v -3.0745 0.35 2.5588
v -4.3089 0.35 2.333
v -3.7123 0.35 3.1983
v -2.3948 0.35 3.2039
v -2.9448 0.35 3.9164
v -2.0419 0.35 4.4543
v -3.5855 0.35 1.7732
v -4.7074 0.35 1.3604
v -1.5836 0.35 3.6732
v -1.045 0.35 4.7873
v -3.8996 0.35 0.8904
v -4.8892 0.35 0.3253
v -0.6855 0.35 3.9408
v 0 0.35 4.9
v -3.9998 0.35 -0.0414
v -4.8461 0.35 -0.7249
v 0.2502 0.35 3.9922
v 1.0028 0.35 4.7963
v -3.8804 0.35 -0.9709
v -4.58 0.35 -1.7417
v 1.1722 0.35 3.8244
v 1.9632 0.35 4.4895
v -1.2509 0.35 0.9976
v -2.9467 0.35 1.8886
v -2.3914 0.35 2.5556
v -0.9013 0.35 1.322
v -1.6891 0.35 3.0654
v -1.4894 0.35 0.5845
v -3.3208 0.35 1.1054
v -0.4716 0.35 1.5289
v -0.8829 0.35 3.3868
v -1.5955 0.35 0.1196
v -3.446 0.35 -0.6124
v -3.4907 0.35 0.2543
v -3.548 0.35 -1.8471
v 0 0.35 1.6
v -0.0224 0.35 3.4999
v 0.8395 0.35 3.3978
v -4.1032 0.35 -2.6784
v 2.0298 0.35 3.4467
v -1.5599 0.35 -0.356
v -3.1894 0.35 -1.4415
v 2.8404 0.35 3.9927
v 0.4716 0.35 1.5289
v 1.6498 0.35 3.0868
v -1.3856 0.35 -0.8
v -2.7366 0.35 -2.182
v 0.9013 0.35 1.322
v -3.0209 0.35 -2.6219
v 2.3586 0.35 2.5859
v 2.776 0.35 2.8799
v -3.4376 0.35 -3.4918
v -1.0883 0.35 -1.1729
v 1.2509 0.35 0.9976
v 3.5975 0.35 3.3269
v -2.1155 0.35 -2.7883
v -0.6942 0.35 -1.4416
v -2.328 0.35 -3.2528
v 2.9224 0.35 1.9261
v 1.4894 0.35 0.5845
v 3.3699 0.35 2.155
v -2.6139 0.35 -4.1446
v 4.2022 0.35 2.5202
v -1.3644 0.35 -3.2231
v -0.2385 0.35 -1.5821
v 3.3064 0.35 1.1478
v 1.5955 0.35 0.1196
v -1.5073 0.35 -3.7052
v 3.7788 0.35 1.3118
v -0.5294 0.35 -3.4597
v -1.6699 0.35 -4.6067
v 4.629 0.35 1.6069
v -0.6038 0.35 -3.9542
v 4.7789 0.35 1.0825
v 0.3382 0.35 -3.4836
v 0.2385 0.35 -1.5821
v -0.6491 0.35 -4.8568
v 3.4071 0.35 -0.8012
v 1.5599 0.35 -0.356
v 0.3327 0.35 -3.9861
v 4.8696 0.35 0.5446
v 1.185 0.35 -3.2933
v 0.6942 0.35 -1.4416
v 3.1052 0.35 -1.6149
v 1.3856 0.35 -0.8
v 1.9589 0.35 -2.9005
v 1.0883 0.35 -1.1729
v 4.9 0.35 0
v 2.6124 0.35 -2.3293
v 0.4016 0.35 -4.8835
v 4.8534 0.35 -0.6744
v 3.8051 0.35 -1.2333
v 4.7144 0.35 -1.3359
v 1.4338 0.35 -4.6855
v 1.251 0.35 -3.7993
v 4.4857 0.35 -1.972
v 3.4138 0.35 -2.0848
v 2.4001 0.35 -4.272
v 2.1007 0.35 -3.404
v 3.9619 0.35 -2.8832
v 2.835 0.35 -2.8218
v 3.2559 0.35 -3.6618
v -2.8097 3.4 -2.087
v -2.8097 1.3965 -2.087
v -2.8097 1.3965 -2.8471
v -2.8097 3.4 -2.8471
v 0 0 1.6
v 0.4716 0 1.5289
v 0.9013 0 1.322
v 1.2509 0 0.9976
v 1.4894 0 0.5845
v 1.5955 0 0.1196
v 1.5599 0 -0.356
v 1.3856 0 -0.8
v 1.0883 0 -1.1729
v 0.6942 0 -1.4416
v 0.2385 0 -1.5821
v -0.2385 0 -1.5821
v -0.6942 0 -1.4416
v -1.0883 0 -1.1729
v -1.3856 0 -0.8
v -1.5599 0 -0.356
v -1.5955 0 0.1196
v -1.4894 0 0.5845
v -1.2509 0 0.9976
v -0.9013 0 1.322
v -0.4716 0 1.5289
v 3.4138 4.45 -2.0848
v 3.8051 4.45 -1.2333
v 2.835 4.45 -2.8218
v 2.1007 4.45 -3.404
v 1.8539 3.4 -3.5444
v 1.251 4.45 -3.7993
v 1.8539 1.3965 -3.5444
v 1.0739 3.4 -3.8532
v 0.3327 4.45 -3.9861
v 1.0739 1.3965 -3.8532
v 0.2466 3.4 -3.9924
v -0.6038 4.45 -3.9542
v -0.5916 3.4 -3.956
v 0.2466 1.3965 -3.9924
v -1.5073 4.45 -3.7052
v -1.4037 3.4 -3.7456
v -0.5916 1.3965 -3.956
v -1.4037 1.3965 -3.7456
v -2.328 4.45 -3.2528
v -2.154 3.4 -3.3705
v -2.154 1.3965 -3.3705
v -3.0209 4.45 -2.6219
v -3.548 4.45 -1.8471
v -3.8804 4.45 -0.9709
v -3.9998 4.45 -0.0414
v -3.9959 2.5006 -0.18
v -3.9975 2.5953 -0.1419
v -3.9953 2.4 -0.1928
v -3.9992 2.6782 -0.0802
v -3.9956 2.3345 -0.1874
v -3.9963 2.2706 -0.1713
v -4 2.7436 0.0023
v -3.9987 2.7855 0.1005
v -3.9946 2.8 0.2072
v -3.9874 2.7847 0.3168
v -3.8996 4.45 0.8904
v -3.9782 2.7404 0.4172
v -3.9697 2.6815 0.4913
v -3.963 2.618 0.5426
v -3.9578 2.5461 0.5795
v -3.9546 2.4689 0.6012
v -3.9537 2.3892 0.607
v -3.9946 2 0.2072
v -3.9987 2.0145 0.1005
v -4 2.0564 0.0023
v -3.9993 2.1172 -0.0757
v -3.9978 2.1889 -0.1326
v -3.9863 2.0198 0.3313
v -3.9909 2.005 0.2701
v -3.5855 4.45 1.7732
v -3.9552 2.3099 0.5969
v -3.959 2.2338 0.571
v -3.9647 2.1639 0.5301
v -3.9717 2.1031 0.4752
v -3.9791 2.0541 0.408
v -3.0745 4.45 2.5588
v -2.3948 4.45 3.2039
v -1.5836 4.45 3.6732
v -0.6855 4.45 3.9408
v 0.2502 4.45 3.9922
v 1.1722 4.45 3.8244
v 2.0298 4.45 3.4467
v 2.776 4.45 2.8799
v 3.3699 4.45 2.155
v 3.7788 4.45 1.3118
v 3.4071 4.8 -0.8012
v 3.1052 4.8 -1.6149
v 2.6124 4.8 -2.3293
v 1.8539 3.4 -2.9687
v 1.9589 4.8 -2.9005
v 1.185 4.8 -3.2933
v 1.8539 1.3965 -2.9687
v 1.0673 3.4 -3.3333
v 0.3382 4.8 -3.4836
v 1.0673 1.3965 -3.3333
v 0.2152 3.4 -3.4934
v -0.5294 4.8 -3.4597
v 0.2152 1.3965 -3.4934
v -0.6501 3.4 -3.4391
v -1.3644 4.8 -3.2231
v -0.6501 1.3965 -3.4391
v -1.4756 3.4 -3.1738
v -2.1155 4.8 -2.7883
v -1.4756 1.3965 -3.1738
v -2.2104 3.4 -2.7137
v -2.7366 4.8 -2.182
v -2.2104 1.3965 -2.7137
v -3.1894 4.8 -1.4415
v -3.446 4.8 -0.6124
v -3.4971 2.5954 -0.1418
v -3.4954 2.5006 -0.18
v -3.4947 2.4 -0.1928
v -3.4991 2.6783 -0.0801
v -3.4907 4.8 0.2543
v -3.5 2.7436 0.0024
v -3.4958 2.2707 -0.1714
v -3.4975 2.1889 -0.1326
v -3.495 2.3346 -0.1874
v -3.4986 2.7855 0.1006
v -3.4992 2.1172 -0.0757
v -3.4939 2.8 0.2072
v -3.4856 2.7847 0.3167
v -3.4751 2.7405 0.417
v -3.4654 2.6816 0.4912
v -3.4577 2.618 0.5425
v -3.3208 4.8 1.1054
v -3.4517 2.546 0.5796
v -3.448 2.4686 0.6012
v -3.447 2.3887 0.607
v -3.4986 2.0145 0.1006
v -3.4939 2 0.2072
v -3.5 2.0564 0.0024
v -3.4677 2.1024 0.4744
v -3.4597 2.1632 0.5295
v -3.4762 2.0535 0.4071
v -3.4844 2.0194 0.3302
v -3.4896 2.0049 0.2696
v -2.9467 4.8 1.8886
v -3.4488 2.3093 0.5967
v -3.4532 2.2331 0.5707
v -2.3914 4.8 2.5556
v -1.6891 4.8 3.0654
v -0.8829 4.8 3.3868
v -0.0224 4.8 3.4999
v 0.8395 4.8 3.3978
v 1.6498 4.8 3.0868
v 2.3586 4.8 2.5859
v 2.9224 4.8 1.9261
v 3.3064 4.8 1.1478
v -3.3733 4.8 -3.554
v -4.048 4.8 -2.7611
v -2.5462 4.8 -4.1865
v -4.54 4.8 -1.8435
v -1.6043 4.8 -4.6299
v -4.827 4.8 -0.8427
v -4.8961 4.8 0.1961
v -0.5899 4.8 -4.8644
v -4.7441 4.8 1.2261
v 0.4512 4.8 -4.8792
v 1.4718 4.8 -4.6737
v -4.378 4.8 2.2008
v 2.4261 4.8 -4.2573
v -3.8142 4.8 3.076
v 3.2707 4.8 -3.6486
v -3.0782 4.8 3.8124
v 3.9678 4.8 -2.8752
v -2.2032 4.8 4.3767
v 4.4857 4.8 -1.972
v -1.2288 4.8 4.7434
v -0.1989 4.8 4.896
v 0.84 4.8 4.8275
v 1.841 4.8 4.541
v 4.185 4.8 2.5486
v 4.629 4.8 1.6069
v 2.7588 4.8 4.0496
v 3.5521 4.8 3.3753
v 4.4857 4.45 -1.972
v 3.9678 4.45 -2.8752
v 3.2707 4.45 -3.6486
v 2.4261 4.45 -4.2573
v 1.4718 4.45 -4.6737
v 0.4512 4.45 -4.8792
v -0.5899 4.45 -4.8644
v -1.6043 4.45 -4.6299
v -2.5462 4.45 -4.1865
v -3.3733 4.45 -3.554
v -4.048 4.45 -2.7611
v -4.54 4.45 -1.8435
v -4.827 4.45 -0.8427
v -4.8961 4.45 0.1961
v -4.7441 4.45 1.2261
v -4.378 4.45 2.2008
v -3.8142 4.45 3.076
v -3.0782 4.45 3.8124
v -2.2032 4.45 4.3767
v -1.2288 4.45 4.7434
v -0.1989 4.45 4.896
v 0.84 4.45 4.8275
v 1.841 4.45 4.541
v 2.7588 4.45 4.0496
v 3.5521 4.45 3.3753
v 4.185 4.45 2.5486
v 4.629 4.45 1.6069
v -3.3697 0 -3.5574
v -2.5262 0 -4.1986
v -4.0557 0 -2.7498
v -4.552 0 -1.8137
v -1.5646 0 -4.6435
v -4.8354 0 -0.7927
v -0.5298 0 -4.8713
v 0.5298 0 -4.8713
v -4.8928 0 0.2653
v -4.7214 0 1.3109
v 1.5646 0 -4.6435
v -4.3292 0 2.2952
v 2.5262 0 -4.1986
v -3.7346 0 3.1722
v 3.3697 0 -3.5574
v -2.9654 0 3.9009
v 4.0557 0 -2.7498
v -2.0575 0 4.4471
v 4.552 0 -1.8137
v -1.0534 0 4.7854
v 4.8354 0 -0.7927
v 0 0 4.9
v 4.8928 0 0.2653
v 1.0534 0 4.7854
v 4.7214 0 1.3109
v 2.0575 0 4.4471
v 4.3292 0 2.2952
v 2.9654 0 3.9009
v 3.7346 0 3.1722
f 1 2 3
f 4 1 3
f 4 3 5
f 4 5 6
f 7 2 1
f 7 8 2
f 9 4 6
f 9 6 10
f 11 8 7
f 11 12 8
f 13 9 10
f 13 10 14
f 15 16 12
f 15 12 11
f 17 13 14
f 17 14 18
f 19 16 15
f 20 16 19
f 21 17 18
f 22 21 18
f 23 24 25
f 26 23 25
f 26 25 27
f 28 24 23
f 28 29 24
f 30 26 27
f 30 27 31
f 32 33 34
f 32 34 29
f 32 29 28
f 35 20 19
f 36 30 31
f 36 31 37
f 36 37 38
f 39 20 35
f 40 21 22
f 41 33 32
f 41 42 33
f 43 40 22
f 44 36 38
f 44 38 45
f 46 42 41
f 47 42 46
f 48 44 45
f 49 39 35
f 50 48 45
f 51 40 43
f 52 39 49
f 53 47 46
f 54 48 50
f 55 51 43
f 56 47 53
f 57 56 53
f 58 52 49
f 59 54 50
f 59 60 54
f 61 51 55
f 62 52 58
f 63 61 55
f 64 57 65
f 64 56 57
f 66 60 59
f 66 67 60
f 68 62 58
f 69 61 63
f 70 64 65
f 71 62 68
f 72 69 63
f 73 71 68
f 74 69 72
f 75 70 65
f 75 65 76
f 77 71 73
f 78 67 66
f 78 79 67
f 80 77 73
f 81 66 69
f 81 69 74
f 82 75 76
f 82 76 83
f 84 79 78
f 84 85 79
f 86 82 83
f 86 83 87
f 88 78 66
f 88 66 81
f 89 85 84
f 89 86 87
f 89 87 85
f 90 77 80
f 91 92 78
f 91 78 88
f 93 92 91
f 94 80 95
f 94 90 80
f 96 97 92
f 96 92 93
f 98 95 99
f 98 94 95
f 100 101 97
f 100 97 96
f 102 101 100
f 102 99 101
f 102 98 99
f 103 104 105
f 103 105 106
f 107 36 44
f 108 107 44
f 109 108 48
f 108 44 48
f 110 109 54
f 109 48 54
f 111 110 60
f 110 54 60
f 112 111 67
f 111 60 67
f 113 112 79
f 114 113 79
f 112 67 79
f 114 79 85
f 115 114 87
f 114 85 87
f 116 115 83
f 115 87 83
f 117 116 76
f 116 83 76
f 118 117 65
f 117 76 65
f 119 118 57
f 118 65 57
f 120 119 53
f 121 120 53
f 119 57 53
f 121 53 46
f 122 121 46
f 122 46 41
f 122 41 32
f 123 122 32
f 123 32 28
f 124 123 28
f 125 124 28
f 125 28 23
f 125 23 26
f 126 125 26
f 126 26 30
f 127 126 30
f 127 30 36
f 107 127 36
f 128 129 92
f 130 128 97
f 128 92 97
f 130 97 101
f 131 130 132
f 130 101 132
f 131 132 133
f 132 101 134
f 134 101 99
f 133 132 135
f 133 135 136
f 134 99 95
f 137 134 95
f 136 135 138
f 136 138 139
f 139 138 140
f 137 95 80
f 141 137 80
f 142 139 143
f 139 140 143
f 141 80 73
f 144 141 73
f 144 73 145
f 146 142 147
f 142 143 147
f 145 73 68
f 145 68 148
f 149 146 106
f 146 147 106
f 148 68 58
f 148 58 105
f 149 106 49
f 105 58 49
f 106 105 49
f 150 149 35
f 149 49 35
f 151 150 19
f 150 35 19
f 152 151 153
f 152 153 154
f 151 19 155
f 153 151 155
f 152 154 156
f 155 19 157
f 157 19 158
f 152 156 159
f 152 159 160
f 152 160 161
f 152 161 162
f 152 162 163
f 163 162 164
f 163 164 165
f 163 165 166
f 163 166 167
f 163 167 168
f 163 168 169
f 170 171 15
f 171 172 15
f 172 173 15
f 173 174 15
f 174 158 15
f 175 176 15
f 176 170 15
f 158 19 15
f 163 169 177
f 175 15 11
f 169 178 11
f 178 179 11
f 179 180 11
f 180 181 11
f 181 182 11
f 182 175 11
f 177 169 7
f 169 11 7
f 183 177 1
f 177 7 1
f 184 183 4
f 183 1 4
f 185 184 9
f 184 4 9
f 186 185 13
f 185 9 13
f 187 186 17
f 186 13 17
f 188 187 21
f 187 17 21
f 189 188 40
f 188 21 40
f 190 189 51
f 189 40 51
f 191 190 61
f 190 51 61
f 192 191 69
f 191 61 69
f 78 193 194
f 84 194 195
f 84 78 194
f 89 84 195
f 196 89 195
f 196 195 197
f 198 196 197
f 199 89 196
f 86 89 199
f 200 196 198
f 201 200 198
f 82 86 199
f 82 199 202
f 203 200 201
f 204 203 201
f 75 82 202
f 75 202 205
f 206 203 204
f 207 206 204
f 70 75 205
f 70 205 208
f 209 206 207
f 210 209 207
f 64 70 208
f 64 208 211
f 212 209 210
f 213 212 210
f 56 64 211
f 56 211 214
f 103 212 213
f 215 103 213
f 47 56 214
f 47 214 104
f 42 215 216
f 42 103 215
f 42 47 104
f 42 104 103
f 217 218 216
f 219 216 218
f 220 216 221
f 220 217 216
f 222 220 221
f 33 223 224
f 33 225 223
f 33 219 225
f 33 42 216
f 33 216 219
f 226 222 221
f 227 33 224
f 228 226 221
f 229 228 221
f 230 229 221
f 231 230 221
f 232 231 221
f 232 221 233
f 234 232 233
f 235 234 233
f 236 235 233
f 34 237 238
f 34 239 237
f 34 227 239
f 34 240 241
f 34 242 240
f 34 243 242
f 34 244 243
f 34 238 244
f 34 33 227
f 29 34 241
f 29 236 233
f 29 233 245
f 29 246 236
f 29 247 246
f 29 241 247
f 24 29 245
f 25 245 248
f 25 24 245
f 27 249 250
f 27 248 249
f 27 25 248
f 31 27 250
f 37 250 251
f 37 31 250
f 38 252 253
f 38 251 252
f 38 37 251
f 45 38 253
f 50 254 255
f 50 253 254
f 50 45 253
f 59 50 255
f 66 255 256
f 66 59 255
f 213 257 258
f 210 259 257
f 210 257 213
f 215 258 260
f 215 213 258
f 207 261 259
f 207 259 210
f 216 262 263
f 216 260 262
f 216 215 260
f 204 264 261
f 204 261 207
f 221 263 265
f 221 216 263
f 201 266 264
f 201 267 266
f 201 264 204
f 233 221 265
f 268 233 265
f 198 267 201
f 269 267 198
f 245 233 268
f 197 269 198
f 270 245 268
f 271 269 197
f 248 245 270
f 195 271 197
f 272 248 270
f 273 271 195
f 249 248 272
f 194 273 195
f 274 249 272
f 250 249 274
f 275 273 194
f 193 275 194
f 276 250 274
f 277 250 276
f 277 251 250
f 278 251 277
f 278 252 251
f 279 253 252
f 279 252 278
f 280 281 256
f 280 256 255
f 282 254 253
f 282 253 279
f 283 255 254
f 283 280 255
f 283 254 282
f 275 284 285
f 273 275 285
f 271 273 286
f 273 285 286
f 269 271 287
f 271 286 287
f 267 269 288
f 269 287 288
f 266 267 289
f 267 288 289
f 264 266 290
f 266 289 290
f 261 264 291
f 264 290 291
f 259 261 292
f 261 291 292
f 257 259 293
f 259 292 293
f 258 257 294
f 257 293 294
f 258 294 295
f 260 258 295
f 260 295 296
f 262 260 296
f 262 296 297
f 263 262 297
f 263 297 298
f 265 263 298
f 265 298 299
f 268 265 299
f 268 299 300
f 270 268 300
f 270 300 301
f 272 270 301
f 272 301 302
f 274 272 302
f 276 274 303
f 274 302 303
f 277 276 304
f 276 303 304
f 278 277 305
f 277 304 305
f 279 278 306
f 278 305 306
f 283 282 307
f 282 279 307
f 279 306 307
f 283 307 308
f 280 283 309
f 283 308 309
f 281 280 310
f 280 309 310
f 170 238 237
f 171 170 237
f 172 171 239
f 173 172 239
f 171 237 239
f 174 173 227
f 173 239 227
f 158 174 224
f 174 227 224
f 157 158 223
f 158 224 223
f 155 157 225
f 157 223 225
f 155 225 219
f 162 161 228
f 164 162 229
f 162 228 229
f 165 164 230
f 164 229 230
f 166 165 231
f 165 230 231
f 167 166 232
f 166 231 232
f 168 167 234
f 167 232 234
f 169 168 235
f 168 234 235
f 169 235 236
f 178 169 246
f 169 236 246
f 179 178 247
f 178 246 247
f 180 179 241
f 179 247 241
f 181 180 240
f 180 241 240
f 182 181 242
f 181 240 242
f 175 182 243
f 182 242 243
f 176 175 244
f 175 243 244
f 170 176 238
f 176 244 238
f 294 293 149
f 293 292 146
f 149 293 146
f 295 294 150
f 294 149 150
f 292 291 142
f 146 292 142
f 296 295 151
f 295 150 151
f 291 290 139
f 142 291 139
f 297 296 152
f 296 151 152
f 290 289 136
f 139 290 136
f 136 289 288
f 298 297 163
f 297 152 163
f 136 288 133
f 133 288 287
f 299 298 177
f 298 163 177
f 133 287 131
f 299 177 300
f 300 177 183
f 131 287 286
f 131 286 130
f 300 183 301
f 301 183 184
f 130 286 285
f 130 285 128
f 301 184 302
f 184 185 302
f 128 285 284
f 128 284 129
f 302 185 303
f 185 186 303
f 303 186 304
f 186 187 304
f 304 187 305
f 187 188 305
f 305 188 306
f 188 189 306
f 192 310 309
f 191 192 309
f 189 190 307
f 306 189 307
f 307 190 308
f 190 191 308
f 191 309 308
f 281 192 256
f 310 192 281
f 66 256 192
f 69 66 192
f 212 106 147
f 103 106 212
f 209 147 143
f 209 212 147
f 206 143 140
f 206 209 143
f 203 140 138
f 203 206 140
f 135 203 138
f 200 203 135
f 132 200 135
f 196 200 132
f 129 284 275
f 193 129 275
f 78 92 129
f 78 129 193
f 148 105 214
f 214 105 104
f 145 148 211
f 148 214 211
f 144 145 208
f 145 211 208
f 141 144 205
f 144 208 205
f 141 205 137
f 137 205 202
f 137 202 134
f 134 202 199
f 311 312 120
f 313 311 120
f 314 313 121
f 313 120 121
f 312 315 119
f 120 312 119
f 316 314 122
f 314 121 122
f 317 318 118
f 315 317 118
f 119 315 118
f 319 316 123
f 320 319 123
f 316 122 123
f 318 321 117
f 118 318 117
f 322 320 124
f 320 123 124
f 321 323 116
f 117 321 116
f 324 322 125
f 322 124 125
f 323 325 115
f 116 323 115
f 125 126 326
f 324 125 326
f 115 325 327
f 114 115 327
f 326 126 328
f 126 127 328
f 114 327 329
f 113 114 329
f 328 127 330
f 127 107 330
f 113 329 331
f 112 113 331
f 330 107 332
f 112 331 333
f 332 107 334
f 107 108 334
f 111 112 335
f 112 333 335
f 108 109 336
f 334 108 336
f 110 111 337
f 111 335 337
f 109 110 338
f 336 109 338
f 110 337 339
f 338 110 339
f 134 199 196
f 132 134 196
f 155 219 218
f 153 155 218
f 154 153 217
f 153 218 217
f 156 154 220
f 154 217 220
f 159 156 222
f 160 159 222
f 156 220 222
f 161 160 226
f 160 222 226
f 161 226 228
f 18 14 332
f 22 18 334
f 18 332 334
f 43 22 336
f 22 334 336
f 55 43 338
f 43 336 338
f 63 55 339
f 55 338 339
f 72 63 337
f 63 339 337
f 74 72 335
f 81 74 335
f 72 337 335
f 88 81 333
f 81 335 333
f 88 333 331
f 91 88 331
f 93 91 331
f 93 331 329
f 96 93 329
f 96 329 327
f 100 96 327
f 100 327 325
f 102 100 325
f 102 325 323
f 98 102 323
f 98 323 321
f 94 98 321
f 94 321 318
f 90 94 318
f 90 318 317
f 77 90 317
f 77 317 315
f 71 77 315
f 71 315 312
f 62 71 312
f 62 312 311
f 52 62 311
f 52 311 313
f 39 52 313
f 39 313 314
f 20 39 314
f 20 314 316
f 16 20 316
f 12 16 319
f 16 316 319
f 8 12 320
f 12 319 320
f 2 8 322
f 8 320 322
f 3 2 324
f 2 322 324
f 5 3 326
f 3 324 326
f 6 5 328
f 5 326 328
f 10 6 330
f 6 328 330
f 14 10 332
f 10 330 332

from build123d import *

# Parameters (mm, degrees)
SKETCH1_R           = 4.9
BOSS_EXTRUDE1_DEPTH = 0.35
SKETCH3_R           = 4
SKETCH3_R_2         = 3.5
BOSS_EXTRUDE2_DEPTH = 4.1
SKETCH4_R           = 4.9
SKETCH4_R_2         = 3.5
BOSS_EXTRUDE3_DEPTH = 0.35
CUT_EXTRUDE1_START  = -4.45
CUT_EXTRUDE1_DEPTH  = 4.45
SKETCH7_W           = 4.663594428
SKETCH7_H           = 2.003453707
CUT_EXTRUDE2_DEPTH  = 11.45
SKETCH8_R           = 1.6
CUT_EXTRUDE3_DEPTH  = 11.45
CUT_EXTRUDE5_DEPTH  = 11.45


with BuildPart() as part:
    # Sketch1 → Boss-Extrude1 (new body)
    with BuildSketch(Plane(origin=(0, 0, 0), x_dir=(1, 0, 0), z_dir=(0, 1, 0))):
        with Locations(Location((0, 0, 0), (0, 0, 270))):
            Circle(SKETCH1_R)
    extrude(amount=BOSS_EXTRUDE1_DEPTH)

    # Sketch3 → Boss-Extrude2 (add)
    with BuildSketch(Plane(origin=(0, 0.35, 0), x_dir=(1, 0, 0), z_dir=(0, 1, 0))):
        with Locations(Location((0, 0, 0), (0, 0, 270))):
            Circle(SKETCH3_R)
        with Locations(Location((0, 0, 0), (0, 0, 270))):
            Circle(SKETCH3_R_2, mode=Mode.SUBTRACT)
    extrude(amount=BOSS_EXTRUDE2_DEPTH)

    # Sketch4 → Boss-Extrude3 (add)
    with BuildSketch(Plane(origin=(0, 4.45, 0), x_dir=(1, 0, 0), z_dir=(0, 1, 0))):
        with Locations(Location((0, 0, 0), (0, 0, 270))):
            Circle(SKETCH4_R)
        with Locations(Location((0, 0, 0), (0, 0, 270))):
            Circle(SKETCH4_R_2, mode=Mode.SUBTRACT)
    extrude(amount=BOSS_EXTRUDE3_DEPTH)

    # Sketch5 → Cut-Extrude1 (cut)
    with BuildSketch(Plane(origin=(0, 4.8, 0), x_dir=(1, 0, 0), z_dir=(0, 1, 0)).offset(CUT_EXTRUDE1_START)):
        with BuildLine():
            Line((4.485667421, 1.972000961), (3.407070658, 0.801167605))
            ThreePointArc((3.407070658, 0.801167605), (3.476690042, 0.403269573), (3.5, 0))
            ThreePointArc((3.5, 0), (3.451272606, -0.581994331), (3.306447199, -1.147783482))
            Line((3.306447199, -1.147783482), (4.629026079, -1.606896874))
            ThreePointArc((4.629026079, -1.606896874), (4.831781648, -0.814792064), (4.9, 0))
            ThreePointArc((4.9, 0), (4.795298237, 1.007529066), (4.485667421, 1.972000961))
        make_face()
    extrude(amount=CUT_EXTRUDE1_DEPTH, mode=Mode.SUBTRACT)

    # Sketch7 → Cut-Extrude2 (cut)
    with BuildSketch(Plane.XY):
        with Locations((-0.477873166, 2.398273147)):
            Rectangle(SKETCH7_W, SKETCH7_H)
    extrude(amount=-CUT_EXTRUDE2_DEPTH, mode=Mode.SUBTRACT)

    # Sketch8 → Cut-Extrude3 (cut)
    with BuildSketch(Plane(origin=(0, 0.35, 0), x_dir=(1, 0, 0), z_dir=(0, 1, 0))):
        with Locations(Location((0, 0, 0), (0, 0, 270))):
            Circle(SKETCH8_R)
    extrude(amount=-CUT_EXTRUDE3_DEPTH, mode=Mode.SUBTRACT)

    # Sketch9 → Cut-Extrude5 (cut)
    with BuildSketch(Plane(origin=(0, 0, 0), x_dir=(0, 0, -1), z_dir=(1, 0, 0))):
        with BuildLine():
            ThreePointArc((0.192835364, 2.4), (0.075678076, 2.682842712), (-0.207164636, 2.8))
            Line((-0.207164636, 2.8), (-0.207164636, 2))
            ThreePointArc((-0.207164636, 2), (0.075678076, 2.117157288), (0.192835364, 2.4))
        make_face()
        with BuildLine():
            Line((-0.207164636, 2), (-0.207164636, 2.8))
            ThreePointArc((-0.207164636, 2.8), (-0.607164636, 2.4), (-0.207164636, 2))
        make_face()
    extrude(amount=-CUT_EXTRUDE5_DEPTH, mode=Mode.SUBTRACT)


solid = part.part
